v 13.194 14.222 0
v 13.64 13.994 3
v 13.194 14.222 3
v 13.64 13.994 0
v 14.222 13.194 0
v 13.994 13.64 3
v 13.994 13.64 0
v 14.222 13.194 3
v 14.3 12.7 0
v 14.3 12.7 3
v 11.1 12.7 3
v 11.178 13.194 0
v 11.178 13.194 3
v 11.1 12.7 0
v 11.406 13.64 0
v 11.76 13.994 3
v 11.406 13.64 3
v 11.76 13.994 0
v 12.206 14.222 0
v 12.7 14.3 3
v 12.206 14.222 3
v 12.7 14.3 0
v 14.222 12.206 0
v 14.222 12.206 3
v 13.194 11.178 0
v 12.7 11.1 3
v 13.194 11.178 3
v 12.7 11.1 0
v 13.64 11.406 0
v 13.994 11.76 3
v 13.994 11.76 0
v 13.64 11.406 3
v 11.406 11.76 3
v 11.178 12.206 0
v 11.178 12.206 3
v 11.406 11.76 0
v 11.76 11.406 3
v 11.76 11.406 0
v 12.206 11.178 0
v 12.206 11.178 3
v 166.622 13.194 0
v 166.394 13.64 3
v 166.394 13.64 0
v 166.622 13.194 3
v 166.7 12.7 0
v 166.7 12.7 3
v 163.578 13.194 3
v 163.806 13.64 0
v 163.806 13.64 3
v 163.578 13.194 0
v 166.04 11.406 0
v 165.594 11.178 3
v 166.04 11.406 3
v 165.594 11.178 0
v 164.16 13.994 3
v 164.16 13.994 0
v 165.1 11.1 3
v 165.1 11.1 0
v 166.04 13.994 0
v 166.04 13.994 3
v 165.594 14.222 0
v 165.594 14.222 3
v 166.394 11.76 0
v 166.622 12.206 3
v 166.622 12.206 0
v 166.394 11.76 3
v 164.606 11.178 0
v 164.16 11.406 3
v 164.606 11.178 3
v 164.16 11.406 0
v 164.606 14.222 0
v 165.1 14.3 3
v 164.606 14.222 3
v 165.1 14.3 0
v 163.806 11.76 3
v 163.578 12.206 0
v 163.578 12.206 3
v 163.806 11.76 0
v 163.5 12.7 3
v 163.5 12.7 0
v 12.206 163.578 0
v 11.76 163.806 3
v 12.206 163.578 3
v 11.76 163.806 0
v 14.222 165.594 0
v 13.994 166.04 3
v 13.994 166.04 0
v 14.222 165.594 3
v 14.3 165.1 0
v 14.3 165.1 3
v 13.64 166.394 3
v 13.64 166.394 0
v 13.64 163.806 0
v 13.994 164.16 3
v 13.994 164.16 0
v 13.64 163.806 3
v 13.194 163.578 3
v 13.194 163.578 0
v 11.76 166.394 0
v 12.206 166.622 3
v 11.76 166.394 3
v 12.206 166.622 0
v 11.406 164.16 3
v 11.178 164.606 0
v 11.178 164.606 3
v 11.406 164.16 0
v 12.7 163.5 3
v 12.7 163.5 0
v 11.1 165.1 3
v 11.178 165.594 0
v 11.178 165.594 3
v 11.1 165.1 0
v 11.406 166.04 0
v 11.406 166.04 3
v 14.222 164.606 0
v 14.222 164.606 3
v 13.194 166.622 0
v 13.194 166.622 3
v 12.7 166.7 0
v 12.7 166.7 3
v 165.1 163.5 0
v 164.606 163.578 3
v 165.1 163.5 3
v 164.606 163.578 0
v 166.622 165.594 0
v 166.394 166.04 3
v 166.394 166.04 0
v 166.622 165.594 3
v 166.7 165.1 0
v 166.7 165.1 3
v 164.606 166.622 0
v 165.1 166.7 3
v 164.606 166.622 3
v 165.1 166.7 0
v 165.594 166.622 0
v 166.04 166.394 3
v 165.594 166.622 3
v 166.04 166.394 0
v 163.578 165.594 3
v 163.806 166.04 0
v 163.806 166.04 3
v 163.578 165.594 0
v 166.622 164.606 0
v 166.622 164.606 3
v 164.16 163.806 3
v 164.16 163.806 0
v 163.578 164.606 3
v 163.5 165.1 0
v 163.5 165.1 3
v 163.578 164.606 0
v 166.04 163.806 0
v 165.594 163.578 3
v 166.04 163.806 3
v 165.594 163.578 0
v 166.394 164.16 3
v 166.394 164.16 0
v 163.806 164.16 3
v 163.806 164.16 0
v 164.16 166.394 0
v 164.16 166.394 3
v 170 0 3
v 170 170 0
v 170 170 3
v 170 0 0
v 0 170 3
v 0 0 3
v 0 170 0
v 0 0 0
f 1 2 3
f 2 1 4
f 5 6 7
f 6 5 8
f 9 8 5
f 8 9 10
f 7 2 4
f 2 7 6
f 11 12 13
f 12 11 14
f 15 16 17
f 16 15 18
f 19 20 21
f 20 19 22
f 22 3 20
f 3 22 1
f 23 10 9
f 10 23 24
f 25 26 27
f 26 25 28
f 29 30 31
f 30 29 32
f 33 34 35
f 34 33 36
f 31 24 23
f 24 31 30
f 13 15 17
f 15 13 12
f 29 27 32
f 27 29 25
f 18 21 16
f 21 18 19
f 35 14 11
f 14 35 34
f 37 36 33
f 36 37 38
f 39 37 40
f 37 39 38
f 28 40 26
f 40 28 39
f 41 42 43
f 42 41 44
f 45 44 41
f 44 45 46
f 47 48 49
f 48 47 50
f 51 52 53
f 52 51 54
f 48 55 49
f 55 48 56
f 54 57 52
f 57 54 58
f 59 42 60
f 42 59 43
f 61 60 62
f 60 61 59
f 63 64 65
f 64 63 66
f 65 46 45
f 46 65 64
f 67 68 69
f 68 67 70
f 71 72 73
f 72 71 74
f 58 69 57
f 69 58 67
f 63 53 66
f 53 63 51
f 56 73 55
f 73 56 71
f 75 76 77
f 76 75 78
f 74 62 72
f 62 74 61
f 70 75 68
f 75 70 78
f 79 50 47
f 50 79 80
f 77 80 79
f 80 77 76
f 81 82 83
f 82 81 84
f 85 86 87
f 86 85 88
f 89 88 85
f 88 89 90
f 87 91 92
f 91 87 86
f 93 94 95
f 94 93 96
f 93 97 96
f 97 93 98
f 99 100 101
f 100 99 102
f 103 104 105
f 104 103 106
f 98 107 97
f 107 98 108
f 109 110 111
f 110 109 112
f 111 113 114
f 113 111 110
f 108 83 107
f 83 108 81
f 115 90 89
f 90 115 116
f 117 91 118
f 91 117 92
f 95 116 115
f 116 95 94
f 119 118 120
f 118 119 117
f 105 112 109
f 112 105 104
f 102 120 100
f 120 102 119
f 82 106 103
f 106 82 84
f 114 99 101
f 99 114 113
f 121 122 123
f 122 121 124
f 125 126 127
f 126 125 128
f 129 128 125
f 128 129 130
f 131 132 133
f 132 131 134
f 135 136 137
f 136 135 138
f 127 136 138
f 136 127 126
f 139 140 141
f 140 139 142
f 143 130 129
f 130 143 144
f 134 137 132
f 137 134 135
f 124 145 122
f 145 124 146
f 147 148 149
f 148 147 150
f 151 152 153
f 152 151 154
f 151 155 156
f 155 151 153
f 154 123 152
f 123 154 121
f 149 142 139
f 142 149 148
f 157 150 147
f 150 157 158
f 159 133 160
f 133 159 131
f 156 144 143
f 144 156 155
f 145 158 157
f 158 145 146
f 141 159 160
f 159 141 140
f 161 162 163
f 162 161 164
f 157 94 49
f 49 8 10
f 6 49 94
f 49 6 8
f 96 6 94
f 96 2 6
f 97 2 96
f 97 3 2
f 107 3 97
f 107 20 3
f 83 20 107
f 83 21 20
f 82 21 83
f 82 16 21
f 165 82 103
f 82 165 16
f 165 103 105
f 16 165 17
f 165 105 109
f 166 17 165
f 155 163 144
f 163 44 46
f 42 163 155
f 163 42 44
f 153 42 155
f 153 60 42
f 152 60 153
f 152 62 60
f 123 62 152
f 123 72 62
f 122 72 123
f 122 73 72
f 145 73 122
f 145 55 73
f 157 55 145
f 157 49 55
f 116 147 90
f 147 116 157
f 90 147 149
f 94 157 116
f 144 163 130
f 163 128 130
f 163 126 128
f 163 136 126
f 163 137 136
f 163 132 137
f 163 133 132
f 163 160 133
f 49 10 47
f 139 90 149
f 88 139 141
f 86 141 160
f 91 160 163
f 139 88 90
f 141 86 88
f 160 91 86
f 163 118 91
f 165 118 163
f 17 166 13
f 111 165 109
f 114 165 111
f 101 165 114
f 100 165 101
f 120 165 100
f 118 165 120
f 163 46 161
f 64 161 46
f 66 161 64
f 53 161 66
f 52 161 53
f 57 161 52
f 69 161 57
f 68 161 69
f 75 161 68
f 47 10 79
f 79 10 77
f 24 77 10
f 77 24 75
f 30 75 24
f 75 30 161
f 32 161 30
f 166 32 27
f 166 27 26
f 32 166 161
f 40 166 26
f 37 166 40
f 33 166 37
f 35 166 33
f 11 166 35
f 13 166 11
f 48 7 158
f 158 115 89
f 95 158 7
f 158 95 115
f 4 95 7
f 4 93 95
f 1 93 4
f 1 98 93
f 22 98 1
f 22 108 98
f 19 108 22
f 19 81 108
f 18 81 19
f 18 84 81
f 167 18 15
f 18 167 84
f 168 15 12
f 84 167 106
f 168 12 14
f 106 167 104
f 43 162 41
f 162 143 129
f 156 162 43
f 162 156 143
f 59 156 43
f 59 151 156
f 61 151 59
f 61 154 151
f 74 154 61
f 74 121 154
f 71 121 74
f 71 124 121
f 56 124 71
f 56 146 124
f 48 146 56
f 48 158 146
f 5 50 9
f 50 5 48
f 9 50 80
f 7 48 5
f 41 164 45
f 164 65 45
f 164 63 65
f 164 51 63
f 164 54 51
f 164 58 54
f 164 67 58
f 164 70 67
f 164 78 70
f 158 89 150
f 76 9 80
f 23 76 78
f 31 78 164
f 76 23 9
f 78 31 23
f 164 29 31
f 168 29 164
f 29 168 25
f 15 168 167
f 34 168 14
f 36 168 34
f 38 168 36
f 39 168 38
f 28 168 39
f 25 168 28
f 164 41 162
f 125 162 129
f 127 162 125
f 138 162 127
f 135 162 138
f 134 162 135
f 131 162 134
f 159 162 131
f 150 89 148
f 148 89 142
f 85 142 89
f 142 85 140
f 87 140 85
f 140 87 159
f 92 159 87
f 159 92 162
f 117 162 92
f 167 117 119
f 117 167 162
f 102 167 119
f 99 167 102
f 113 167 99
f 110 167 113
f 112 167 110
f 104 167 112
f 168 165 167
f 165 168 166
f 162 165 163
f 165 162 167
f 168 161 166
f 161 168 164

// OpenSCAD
// file: ../dimensions.scad
// Shared dimensions for all case components
// This file defines common parameters used across multiple case parts

// --- Wall and Material ---
wall_thickness = 3;

// --- Motherboard (Mini-ITX) ---
mobo_width = 170;
mobo_depth = 170;
mobo_pcb_thickness = 1.6;

// --- Standoffs ---
standoff_height = 6;
standoff_hole_radius = 1.6;  // M3 clearance
standoff_locations = [
    [12.7, 12.7],
    [165.1, 12.7],
    [12.7, 165.1],
    [165.1, 165.1]
];

// --- I/O Shield ---
io_shield_width = 152.4;    // 6 inches
io_shield_height = 33.87;   // 1 1/3 inches
io_shield_x_offset = (mobo_width - io_shield_width) / 2;
io_shield_z_offset = 5;     // 5mm from bottom of plate

// --- Backplate ---
backplate_height = 88.9;    // 3.5 inches
backplate_thickness = wall_thickness;

// --- CPU Cooler (Noctua NH-L12S) ---
cooler_width = 128;
cooler_depth = 146;
cooler_heatsink_height = 70;
cooler_fan_height = 16;
cooler_total_height = cooler_heatsink_height + cooler_fan_height;  // 86mm

// --- Power Supplies ---
// Flex ATX (from technical drawing)
// Orientation: 80mm wide (X), 150mm deep (Y), 40mm tall (Z)
flex_atx_width = 80.0;      // G: Width (X - wider face)
flex_atx_length = 150.0;    // B: Length (Y - depth)
flex_atx_height = 40.0;     // A: Height (Z - shortest side on bottom)

// Flex ATX Mounting holes - 8-32 UNC thread (4 places)
flex_atx_mount_hole_radius = 2.1;   // 8-32 clearance (~4.2mm dia)
flex_atx_mount_h_spacing = 63.5;    // F: Horizontal hole spacing (within 80mm width)
flex_atx_mount_v_spacing = 12.5;    // K: Vertical offset from edges

// SFX
sfx_length = 125;
sfx_width = 100;
sfx_height = 63.5;

// --- Derived Interior Dimensions ---
interior_height = standoff_height + mobo_pcb_thickness + cooler_total_height;  // ~94mm

// --- Minimal Config External Dimensions ---
// Motherboard area only (without PSU)
minimal_mobo_exterior_width = mobo_width + 2 * wall_thickness;   // 176mm
minimal_mobo_exterior_depth = mobo_depth + 2 * wall_thickness;   // 176mm
minimal_exterior_height = interior_height + 2 * wall_thickness;   // ~100mm

// With Flex ATX PSU next to motherboard
minimal_with_psu_width = minimal_mobo_exterior_width + flex_atx_width;  // ~256mm

// --- Ventilation ---
honeycomb_radius = 3;
vent_padding = 5;

// --- Screw Holes for Panel Assembly ---
panel_screw_radius = 1.6;  // M3
panel_screw_inset = 8;     // Distance from edge

// --- GPU ---
gpu_length = 320;          // Max GPU length
gpu_height = 140;          // GPU PCB + cooler height
gpu_width = 60;            // 3 slots

// --- GPU Config External Dimensions ---
// From SPEC.md Section 8.4
gpu_config_width = 171;    // mm
gpu_config_depth = 378;    // mm
gpu_config_height = 190;   // mm

// --- Fans ---
fan_120_size = 120;
fan_120_thickness = 25;
fan_140_size = 140;
fan_140_thickness = 25;

// --- AIO Radiator ---
radiator_240_length = 275;
radiator_240_width = 120;
radiator_240_thickness = 27;

// --- NAS Many-Disk Config ---
// 5-8 drives mounted vertically (on narrowest side)
hdd_width = 101.6;
hdd_length = 147;
hdd_height = 26.1;
nas_many_drive_count = 6;  // Default 6 drives
nas_many_drive_spacing = 5;
nas_many_enclosure_height = hdd_width + wall_thickness + 5;  // ~110mm (drives on side)

// --- Power Inlet C14 ---
c14_width = 50;
c14_height = 27;
c14_depth = 30;
// main file
// Motherboard mounting plate for Mini-ITX
// 170x170mm plate with standoff mounting holes

include <../dimensions.scad>

module motherboard_plate() {
    color("blue") {
        difference() {
            cube([mobo_width, mobo_depth, wall_thickness]);

            // Standoff mounting holes
            for (loc = standoff_locations) {
                translate([loc[0], loc[1], -0.1]) {
                    cylinder(h = wall_thickness + 0.2, r = standoff_hole_radius, $fn = 20);
                }
            }
        }
    }
}

// Preview
motherboard_plate();
